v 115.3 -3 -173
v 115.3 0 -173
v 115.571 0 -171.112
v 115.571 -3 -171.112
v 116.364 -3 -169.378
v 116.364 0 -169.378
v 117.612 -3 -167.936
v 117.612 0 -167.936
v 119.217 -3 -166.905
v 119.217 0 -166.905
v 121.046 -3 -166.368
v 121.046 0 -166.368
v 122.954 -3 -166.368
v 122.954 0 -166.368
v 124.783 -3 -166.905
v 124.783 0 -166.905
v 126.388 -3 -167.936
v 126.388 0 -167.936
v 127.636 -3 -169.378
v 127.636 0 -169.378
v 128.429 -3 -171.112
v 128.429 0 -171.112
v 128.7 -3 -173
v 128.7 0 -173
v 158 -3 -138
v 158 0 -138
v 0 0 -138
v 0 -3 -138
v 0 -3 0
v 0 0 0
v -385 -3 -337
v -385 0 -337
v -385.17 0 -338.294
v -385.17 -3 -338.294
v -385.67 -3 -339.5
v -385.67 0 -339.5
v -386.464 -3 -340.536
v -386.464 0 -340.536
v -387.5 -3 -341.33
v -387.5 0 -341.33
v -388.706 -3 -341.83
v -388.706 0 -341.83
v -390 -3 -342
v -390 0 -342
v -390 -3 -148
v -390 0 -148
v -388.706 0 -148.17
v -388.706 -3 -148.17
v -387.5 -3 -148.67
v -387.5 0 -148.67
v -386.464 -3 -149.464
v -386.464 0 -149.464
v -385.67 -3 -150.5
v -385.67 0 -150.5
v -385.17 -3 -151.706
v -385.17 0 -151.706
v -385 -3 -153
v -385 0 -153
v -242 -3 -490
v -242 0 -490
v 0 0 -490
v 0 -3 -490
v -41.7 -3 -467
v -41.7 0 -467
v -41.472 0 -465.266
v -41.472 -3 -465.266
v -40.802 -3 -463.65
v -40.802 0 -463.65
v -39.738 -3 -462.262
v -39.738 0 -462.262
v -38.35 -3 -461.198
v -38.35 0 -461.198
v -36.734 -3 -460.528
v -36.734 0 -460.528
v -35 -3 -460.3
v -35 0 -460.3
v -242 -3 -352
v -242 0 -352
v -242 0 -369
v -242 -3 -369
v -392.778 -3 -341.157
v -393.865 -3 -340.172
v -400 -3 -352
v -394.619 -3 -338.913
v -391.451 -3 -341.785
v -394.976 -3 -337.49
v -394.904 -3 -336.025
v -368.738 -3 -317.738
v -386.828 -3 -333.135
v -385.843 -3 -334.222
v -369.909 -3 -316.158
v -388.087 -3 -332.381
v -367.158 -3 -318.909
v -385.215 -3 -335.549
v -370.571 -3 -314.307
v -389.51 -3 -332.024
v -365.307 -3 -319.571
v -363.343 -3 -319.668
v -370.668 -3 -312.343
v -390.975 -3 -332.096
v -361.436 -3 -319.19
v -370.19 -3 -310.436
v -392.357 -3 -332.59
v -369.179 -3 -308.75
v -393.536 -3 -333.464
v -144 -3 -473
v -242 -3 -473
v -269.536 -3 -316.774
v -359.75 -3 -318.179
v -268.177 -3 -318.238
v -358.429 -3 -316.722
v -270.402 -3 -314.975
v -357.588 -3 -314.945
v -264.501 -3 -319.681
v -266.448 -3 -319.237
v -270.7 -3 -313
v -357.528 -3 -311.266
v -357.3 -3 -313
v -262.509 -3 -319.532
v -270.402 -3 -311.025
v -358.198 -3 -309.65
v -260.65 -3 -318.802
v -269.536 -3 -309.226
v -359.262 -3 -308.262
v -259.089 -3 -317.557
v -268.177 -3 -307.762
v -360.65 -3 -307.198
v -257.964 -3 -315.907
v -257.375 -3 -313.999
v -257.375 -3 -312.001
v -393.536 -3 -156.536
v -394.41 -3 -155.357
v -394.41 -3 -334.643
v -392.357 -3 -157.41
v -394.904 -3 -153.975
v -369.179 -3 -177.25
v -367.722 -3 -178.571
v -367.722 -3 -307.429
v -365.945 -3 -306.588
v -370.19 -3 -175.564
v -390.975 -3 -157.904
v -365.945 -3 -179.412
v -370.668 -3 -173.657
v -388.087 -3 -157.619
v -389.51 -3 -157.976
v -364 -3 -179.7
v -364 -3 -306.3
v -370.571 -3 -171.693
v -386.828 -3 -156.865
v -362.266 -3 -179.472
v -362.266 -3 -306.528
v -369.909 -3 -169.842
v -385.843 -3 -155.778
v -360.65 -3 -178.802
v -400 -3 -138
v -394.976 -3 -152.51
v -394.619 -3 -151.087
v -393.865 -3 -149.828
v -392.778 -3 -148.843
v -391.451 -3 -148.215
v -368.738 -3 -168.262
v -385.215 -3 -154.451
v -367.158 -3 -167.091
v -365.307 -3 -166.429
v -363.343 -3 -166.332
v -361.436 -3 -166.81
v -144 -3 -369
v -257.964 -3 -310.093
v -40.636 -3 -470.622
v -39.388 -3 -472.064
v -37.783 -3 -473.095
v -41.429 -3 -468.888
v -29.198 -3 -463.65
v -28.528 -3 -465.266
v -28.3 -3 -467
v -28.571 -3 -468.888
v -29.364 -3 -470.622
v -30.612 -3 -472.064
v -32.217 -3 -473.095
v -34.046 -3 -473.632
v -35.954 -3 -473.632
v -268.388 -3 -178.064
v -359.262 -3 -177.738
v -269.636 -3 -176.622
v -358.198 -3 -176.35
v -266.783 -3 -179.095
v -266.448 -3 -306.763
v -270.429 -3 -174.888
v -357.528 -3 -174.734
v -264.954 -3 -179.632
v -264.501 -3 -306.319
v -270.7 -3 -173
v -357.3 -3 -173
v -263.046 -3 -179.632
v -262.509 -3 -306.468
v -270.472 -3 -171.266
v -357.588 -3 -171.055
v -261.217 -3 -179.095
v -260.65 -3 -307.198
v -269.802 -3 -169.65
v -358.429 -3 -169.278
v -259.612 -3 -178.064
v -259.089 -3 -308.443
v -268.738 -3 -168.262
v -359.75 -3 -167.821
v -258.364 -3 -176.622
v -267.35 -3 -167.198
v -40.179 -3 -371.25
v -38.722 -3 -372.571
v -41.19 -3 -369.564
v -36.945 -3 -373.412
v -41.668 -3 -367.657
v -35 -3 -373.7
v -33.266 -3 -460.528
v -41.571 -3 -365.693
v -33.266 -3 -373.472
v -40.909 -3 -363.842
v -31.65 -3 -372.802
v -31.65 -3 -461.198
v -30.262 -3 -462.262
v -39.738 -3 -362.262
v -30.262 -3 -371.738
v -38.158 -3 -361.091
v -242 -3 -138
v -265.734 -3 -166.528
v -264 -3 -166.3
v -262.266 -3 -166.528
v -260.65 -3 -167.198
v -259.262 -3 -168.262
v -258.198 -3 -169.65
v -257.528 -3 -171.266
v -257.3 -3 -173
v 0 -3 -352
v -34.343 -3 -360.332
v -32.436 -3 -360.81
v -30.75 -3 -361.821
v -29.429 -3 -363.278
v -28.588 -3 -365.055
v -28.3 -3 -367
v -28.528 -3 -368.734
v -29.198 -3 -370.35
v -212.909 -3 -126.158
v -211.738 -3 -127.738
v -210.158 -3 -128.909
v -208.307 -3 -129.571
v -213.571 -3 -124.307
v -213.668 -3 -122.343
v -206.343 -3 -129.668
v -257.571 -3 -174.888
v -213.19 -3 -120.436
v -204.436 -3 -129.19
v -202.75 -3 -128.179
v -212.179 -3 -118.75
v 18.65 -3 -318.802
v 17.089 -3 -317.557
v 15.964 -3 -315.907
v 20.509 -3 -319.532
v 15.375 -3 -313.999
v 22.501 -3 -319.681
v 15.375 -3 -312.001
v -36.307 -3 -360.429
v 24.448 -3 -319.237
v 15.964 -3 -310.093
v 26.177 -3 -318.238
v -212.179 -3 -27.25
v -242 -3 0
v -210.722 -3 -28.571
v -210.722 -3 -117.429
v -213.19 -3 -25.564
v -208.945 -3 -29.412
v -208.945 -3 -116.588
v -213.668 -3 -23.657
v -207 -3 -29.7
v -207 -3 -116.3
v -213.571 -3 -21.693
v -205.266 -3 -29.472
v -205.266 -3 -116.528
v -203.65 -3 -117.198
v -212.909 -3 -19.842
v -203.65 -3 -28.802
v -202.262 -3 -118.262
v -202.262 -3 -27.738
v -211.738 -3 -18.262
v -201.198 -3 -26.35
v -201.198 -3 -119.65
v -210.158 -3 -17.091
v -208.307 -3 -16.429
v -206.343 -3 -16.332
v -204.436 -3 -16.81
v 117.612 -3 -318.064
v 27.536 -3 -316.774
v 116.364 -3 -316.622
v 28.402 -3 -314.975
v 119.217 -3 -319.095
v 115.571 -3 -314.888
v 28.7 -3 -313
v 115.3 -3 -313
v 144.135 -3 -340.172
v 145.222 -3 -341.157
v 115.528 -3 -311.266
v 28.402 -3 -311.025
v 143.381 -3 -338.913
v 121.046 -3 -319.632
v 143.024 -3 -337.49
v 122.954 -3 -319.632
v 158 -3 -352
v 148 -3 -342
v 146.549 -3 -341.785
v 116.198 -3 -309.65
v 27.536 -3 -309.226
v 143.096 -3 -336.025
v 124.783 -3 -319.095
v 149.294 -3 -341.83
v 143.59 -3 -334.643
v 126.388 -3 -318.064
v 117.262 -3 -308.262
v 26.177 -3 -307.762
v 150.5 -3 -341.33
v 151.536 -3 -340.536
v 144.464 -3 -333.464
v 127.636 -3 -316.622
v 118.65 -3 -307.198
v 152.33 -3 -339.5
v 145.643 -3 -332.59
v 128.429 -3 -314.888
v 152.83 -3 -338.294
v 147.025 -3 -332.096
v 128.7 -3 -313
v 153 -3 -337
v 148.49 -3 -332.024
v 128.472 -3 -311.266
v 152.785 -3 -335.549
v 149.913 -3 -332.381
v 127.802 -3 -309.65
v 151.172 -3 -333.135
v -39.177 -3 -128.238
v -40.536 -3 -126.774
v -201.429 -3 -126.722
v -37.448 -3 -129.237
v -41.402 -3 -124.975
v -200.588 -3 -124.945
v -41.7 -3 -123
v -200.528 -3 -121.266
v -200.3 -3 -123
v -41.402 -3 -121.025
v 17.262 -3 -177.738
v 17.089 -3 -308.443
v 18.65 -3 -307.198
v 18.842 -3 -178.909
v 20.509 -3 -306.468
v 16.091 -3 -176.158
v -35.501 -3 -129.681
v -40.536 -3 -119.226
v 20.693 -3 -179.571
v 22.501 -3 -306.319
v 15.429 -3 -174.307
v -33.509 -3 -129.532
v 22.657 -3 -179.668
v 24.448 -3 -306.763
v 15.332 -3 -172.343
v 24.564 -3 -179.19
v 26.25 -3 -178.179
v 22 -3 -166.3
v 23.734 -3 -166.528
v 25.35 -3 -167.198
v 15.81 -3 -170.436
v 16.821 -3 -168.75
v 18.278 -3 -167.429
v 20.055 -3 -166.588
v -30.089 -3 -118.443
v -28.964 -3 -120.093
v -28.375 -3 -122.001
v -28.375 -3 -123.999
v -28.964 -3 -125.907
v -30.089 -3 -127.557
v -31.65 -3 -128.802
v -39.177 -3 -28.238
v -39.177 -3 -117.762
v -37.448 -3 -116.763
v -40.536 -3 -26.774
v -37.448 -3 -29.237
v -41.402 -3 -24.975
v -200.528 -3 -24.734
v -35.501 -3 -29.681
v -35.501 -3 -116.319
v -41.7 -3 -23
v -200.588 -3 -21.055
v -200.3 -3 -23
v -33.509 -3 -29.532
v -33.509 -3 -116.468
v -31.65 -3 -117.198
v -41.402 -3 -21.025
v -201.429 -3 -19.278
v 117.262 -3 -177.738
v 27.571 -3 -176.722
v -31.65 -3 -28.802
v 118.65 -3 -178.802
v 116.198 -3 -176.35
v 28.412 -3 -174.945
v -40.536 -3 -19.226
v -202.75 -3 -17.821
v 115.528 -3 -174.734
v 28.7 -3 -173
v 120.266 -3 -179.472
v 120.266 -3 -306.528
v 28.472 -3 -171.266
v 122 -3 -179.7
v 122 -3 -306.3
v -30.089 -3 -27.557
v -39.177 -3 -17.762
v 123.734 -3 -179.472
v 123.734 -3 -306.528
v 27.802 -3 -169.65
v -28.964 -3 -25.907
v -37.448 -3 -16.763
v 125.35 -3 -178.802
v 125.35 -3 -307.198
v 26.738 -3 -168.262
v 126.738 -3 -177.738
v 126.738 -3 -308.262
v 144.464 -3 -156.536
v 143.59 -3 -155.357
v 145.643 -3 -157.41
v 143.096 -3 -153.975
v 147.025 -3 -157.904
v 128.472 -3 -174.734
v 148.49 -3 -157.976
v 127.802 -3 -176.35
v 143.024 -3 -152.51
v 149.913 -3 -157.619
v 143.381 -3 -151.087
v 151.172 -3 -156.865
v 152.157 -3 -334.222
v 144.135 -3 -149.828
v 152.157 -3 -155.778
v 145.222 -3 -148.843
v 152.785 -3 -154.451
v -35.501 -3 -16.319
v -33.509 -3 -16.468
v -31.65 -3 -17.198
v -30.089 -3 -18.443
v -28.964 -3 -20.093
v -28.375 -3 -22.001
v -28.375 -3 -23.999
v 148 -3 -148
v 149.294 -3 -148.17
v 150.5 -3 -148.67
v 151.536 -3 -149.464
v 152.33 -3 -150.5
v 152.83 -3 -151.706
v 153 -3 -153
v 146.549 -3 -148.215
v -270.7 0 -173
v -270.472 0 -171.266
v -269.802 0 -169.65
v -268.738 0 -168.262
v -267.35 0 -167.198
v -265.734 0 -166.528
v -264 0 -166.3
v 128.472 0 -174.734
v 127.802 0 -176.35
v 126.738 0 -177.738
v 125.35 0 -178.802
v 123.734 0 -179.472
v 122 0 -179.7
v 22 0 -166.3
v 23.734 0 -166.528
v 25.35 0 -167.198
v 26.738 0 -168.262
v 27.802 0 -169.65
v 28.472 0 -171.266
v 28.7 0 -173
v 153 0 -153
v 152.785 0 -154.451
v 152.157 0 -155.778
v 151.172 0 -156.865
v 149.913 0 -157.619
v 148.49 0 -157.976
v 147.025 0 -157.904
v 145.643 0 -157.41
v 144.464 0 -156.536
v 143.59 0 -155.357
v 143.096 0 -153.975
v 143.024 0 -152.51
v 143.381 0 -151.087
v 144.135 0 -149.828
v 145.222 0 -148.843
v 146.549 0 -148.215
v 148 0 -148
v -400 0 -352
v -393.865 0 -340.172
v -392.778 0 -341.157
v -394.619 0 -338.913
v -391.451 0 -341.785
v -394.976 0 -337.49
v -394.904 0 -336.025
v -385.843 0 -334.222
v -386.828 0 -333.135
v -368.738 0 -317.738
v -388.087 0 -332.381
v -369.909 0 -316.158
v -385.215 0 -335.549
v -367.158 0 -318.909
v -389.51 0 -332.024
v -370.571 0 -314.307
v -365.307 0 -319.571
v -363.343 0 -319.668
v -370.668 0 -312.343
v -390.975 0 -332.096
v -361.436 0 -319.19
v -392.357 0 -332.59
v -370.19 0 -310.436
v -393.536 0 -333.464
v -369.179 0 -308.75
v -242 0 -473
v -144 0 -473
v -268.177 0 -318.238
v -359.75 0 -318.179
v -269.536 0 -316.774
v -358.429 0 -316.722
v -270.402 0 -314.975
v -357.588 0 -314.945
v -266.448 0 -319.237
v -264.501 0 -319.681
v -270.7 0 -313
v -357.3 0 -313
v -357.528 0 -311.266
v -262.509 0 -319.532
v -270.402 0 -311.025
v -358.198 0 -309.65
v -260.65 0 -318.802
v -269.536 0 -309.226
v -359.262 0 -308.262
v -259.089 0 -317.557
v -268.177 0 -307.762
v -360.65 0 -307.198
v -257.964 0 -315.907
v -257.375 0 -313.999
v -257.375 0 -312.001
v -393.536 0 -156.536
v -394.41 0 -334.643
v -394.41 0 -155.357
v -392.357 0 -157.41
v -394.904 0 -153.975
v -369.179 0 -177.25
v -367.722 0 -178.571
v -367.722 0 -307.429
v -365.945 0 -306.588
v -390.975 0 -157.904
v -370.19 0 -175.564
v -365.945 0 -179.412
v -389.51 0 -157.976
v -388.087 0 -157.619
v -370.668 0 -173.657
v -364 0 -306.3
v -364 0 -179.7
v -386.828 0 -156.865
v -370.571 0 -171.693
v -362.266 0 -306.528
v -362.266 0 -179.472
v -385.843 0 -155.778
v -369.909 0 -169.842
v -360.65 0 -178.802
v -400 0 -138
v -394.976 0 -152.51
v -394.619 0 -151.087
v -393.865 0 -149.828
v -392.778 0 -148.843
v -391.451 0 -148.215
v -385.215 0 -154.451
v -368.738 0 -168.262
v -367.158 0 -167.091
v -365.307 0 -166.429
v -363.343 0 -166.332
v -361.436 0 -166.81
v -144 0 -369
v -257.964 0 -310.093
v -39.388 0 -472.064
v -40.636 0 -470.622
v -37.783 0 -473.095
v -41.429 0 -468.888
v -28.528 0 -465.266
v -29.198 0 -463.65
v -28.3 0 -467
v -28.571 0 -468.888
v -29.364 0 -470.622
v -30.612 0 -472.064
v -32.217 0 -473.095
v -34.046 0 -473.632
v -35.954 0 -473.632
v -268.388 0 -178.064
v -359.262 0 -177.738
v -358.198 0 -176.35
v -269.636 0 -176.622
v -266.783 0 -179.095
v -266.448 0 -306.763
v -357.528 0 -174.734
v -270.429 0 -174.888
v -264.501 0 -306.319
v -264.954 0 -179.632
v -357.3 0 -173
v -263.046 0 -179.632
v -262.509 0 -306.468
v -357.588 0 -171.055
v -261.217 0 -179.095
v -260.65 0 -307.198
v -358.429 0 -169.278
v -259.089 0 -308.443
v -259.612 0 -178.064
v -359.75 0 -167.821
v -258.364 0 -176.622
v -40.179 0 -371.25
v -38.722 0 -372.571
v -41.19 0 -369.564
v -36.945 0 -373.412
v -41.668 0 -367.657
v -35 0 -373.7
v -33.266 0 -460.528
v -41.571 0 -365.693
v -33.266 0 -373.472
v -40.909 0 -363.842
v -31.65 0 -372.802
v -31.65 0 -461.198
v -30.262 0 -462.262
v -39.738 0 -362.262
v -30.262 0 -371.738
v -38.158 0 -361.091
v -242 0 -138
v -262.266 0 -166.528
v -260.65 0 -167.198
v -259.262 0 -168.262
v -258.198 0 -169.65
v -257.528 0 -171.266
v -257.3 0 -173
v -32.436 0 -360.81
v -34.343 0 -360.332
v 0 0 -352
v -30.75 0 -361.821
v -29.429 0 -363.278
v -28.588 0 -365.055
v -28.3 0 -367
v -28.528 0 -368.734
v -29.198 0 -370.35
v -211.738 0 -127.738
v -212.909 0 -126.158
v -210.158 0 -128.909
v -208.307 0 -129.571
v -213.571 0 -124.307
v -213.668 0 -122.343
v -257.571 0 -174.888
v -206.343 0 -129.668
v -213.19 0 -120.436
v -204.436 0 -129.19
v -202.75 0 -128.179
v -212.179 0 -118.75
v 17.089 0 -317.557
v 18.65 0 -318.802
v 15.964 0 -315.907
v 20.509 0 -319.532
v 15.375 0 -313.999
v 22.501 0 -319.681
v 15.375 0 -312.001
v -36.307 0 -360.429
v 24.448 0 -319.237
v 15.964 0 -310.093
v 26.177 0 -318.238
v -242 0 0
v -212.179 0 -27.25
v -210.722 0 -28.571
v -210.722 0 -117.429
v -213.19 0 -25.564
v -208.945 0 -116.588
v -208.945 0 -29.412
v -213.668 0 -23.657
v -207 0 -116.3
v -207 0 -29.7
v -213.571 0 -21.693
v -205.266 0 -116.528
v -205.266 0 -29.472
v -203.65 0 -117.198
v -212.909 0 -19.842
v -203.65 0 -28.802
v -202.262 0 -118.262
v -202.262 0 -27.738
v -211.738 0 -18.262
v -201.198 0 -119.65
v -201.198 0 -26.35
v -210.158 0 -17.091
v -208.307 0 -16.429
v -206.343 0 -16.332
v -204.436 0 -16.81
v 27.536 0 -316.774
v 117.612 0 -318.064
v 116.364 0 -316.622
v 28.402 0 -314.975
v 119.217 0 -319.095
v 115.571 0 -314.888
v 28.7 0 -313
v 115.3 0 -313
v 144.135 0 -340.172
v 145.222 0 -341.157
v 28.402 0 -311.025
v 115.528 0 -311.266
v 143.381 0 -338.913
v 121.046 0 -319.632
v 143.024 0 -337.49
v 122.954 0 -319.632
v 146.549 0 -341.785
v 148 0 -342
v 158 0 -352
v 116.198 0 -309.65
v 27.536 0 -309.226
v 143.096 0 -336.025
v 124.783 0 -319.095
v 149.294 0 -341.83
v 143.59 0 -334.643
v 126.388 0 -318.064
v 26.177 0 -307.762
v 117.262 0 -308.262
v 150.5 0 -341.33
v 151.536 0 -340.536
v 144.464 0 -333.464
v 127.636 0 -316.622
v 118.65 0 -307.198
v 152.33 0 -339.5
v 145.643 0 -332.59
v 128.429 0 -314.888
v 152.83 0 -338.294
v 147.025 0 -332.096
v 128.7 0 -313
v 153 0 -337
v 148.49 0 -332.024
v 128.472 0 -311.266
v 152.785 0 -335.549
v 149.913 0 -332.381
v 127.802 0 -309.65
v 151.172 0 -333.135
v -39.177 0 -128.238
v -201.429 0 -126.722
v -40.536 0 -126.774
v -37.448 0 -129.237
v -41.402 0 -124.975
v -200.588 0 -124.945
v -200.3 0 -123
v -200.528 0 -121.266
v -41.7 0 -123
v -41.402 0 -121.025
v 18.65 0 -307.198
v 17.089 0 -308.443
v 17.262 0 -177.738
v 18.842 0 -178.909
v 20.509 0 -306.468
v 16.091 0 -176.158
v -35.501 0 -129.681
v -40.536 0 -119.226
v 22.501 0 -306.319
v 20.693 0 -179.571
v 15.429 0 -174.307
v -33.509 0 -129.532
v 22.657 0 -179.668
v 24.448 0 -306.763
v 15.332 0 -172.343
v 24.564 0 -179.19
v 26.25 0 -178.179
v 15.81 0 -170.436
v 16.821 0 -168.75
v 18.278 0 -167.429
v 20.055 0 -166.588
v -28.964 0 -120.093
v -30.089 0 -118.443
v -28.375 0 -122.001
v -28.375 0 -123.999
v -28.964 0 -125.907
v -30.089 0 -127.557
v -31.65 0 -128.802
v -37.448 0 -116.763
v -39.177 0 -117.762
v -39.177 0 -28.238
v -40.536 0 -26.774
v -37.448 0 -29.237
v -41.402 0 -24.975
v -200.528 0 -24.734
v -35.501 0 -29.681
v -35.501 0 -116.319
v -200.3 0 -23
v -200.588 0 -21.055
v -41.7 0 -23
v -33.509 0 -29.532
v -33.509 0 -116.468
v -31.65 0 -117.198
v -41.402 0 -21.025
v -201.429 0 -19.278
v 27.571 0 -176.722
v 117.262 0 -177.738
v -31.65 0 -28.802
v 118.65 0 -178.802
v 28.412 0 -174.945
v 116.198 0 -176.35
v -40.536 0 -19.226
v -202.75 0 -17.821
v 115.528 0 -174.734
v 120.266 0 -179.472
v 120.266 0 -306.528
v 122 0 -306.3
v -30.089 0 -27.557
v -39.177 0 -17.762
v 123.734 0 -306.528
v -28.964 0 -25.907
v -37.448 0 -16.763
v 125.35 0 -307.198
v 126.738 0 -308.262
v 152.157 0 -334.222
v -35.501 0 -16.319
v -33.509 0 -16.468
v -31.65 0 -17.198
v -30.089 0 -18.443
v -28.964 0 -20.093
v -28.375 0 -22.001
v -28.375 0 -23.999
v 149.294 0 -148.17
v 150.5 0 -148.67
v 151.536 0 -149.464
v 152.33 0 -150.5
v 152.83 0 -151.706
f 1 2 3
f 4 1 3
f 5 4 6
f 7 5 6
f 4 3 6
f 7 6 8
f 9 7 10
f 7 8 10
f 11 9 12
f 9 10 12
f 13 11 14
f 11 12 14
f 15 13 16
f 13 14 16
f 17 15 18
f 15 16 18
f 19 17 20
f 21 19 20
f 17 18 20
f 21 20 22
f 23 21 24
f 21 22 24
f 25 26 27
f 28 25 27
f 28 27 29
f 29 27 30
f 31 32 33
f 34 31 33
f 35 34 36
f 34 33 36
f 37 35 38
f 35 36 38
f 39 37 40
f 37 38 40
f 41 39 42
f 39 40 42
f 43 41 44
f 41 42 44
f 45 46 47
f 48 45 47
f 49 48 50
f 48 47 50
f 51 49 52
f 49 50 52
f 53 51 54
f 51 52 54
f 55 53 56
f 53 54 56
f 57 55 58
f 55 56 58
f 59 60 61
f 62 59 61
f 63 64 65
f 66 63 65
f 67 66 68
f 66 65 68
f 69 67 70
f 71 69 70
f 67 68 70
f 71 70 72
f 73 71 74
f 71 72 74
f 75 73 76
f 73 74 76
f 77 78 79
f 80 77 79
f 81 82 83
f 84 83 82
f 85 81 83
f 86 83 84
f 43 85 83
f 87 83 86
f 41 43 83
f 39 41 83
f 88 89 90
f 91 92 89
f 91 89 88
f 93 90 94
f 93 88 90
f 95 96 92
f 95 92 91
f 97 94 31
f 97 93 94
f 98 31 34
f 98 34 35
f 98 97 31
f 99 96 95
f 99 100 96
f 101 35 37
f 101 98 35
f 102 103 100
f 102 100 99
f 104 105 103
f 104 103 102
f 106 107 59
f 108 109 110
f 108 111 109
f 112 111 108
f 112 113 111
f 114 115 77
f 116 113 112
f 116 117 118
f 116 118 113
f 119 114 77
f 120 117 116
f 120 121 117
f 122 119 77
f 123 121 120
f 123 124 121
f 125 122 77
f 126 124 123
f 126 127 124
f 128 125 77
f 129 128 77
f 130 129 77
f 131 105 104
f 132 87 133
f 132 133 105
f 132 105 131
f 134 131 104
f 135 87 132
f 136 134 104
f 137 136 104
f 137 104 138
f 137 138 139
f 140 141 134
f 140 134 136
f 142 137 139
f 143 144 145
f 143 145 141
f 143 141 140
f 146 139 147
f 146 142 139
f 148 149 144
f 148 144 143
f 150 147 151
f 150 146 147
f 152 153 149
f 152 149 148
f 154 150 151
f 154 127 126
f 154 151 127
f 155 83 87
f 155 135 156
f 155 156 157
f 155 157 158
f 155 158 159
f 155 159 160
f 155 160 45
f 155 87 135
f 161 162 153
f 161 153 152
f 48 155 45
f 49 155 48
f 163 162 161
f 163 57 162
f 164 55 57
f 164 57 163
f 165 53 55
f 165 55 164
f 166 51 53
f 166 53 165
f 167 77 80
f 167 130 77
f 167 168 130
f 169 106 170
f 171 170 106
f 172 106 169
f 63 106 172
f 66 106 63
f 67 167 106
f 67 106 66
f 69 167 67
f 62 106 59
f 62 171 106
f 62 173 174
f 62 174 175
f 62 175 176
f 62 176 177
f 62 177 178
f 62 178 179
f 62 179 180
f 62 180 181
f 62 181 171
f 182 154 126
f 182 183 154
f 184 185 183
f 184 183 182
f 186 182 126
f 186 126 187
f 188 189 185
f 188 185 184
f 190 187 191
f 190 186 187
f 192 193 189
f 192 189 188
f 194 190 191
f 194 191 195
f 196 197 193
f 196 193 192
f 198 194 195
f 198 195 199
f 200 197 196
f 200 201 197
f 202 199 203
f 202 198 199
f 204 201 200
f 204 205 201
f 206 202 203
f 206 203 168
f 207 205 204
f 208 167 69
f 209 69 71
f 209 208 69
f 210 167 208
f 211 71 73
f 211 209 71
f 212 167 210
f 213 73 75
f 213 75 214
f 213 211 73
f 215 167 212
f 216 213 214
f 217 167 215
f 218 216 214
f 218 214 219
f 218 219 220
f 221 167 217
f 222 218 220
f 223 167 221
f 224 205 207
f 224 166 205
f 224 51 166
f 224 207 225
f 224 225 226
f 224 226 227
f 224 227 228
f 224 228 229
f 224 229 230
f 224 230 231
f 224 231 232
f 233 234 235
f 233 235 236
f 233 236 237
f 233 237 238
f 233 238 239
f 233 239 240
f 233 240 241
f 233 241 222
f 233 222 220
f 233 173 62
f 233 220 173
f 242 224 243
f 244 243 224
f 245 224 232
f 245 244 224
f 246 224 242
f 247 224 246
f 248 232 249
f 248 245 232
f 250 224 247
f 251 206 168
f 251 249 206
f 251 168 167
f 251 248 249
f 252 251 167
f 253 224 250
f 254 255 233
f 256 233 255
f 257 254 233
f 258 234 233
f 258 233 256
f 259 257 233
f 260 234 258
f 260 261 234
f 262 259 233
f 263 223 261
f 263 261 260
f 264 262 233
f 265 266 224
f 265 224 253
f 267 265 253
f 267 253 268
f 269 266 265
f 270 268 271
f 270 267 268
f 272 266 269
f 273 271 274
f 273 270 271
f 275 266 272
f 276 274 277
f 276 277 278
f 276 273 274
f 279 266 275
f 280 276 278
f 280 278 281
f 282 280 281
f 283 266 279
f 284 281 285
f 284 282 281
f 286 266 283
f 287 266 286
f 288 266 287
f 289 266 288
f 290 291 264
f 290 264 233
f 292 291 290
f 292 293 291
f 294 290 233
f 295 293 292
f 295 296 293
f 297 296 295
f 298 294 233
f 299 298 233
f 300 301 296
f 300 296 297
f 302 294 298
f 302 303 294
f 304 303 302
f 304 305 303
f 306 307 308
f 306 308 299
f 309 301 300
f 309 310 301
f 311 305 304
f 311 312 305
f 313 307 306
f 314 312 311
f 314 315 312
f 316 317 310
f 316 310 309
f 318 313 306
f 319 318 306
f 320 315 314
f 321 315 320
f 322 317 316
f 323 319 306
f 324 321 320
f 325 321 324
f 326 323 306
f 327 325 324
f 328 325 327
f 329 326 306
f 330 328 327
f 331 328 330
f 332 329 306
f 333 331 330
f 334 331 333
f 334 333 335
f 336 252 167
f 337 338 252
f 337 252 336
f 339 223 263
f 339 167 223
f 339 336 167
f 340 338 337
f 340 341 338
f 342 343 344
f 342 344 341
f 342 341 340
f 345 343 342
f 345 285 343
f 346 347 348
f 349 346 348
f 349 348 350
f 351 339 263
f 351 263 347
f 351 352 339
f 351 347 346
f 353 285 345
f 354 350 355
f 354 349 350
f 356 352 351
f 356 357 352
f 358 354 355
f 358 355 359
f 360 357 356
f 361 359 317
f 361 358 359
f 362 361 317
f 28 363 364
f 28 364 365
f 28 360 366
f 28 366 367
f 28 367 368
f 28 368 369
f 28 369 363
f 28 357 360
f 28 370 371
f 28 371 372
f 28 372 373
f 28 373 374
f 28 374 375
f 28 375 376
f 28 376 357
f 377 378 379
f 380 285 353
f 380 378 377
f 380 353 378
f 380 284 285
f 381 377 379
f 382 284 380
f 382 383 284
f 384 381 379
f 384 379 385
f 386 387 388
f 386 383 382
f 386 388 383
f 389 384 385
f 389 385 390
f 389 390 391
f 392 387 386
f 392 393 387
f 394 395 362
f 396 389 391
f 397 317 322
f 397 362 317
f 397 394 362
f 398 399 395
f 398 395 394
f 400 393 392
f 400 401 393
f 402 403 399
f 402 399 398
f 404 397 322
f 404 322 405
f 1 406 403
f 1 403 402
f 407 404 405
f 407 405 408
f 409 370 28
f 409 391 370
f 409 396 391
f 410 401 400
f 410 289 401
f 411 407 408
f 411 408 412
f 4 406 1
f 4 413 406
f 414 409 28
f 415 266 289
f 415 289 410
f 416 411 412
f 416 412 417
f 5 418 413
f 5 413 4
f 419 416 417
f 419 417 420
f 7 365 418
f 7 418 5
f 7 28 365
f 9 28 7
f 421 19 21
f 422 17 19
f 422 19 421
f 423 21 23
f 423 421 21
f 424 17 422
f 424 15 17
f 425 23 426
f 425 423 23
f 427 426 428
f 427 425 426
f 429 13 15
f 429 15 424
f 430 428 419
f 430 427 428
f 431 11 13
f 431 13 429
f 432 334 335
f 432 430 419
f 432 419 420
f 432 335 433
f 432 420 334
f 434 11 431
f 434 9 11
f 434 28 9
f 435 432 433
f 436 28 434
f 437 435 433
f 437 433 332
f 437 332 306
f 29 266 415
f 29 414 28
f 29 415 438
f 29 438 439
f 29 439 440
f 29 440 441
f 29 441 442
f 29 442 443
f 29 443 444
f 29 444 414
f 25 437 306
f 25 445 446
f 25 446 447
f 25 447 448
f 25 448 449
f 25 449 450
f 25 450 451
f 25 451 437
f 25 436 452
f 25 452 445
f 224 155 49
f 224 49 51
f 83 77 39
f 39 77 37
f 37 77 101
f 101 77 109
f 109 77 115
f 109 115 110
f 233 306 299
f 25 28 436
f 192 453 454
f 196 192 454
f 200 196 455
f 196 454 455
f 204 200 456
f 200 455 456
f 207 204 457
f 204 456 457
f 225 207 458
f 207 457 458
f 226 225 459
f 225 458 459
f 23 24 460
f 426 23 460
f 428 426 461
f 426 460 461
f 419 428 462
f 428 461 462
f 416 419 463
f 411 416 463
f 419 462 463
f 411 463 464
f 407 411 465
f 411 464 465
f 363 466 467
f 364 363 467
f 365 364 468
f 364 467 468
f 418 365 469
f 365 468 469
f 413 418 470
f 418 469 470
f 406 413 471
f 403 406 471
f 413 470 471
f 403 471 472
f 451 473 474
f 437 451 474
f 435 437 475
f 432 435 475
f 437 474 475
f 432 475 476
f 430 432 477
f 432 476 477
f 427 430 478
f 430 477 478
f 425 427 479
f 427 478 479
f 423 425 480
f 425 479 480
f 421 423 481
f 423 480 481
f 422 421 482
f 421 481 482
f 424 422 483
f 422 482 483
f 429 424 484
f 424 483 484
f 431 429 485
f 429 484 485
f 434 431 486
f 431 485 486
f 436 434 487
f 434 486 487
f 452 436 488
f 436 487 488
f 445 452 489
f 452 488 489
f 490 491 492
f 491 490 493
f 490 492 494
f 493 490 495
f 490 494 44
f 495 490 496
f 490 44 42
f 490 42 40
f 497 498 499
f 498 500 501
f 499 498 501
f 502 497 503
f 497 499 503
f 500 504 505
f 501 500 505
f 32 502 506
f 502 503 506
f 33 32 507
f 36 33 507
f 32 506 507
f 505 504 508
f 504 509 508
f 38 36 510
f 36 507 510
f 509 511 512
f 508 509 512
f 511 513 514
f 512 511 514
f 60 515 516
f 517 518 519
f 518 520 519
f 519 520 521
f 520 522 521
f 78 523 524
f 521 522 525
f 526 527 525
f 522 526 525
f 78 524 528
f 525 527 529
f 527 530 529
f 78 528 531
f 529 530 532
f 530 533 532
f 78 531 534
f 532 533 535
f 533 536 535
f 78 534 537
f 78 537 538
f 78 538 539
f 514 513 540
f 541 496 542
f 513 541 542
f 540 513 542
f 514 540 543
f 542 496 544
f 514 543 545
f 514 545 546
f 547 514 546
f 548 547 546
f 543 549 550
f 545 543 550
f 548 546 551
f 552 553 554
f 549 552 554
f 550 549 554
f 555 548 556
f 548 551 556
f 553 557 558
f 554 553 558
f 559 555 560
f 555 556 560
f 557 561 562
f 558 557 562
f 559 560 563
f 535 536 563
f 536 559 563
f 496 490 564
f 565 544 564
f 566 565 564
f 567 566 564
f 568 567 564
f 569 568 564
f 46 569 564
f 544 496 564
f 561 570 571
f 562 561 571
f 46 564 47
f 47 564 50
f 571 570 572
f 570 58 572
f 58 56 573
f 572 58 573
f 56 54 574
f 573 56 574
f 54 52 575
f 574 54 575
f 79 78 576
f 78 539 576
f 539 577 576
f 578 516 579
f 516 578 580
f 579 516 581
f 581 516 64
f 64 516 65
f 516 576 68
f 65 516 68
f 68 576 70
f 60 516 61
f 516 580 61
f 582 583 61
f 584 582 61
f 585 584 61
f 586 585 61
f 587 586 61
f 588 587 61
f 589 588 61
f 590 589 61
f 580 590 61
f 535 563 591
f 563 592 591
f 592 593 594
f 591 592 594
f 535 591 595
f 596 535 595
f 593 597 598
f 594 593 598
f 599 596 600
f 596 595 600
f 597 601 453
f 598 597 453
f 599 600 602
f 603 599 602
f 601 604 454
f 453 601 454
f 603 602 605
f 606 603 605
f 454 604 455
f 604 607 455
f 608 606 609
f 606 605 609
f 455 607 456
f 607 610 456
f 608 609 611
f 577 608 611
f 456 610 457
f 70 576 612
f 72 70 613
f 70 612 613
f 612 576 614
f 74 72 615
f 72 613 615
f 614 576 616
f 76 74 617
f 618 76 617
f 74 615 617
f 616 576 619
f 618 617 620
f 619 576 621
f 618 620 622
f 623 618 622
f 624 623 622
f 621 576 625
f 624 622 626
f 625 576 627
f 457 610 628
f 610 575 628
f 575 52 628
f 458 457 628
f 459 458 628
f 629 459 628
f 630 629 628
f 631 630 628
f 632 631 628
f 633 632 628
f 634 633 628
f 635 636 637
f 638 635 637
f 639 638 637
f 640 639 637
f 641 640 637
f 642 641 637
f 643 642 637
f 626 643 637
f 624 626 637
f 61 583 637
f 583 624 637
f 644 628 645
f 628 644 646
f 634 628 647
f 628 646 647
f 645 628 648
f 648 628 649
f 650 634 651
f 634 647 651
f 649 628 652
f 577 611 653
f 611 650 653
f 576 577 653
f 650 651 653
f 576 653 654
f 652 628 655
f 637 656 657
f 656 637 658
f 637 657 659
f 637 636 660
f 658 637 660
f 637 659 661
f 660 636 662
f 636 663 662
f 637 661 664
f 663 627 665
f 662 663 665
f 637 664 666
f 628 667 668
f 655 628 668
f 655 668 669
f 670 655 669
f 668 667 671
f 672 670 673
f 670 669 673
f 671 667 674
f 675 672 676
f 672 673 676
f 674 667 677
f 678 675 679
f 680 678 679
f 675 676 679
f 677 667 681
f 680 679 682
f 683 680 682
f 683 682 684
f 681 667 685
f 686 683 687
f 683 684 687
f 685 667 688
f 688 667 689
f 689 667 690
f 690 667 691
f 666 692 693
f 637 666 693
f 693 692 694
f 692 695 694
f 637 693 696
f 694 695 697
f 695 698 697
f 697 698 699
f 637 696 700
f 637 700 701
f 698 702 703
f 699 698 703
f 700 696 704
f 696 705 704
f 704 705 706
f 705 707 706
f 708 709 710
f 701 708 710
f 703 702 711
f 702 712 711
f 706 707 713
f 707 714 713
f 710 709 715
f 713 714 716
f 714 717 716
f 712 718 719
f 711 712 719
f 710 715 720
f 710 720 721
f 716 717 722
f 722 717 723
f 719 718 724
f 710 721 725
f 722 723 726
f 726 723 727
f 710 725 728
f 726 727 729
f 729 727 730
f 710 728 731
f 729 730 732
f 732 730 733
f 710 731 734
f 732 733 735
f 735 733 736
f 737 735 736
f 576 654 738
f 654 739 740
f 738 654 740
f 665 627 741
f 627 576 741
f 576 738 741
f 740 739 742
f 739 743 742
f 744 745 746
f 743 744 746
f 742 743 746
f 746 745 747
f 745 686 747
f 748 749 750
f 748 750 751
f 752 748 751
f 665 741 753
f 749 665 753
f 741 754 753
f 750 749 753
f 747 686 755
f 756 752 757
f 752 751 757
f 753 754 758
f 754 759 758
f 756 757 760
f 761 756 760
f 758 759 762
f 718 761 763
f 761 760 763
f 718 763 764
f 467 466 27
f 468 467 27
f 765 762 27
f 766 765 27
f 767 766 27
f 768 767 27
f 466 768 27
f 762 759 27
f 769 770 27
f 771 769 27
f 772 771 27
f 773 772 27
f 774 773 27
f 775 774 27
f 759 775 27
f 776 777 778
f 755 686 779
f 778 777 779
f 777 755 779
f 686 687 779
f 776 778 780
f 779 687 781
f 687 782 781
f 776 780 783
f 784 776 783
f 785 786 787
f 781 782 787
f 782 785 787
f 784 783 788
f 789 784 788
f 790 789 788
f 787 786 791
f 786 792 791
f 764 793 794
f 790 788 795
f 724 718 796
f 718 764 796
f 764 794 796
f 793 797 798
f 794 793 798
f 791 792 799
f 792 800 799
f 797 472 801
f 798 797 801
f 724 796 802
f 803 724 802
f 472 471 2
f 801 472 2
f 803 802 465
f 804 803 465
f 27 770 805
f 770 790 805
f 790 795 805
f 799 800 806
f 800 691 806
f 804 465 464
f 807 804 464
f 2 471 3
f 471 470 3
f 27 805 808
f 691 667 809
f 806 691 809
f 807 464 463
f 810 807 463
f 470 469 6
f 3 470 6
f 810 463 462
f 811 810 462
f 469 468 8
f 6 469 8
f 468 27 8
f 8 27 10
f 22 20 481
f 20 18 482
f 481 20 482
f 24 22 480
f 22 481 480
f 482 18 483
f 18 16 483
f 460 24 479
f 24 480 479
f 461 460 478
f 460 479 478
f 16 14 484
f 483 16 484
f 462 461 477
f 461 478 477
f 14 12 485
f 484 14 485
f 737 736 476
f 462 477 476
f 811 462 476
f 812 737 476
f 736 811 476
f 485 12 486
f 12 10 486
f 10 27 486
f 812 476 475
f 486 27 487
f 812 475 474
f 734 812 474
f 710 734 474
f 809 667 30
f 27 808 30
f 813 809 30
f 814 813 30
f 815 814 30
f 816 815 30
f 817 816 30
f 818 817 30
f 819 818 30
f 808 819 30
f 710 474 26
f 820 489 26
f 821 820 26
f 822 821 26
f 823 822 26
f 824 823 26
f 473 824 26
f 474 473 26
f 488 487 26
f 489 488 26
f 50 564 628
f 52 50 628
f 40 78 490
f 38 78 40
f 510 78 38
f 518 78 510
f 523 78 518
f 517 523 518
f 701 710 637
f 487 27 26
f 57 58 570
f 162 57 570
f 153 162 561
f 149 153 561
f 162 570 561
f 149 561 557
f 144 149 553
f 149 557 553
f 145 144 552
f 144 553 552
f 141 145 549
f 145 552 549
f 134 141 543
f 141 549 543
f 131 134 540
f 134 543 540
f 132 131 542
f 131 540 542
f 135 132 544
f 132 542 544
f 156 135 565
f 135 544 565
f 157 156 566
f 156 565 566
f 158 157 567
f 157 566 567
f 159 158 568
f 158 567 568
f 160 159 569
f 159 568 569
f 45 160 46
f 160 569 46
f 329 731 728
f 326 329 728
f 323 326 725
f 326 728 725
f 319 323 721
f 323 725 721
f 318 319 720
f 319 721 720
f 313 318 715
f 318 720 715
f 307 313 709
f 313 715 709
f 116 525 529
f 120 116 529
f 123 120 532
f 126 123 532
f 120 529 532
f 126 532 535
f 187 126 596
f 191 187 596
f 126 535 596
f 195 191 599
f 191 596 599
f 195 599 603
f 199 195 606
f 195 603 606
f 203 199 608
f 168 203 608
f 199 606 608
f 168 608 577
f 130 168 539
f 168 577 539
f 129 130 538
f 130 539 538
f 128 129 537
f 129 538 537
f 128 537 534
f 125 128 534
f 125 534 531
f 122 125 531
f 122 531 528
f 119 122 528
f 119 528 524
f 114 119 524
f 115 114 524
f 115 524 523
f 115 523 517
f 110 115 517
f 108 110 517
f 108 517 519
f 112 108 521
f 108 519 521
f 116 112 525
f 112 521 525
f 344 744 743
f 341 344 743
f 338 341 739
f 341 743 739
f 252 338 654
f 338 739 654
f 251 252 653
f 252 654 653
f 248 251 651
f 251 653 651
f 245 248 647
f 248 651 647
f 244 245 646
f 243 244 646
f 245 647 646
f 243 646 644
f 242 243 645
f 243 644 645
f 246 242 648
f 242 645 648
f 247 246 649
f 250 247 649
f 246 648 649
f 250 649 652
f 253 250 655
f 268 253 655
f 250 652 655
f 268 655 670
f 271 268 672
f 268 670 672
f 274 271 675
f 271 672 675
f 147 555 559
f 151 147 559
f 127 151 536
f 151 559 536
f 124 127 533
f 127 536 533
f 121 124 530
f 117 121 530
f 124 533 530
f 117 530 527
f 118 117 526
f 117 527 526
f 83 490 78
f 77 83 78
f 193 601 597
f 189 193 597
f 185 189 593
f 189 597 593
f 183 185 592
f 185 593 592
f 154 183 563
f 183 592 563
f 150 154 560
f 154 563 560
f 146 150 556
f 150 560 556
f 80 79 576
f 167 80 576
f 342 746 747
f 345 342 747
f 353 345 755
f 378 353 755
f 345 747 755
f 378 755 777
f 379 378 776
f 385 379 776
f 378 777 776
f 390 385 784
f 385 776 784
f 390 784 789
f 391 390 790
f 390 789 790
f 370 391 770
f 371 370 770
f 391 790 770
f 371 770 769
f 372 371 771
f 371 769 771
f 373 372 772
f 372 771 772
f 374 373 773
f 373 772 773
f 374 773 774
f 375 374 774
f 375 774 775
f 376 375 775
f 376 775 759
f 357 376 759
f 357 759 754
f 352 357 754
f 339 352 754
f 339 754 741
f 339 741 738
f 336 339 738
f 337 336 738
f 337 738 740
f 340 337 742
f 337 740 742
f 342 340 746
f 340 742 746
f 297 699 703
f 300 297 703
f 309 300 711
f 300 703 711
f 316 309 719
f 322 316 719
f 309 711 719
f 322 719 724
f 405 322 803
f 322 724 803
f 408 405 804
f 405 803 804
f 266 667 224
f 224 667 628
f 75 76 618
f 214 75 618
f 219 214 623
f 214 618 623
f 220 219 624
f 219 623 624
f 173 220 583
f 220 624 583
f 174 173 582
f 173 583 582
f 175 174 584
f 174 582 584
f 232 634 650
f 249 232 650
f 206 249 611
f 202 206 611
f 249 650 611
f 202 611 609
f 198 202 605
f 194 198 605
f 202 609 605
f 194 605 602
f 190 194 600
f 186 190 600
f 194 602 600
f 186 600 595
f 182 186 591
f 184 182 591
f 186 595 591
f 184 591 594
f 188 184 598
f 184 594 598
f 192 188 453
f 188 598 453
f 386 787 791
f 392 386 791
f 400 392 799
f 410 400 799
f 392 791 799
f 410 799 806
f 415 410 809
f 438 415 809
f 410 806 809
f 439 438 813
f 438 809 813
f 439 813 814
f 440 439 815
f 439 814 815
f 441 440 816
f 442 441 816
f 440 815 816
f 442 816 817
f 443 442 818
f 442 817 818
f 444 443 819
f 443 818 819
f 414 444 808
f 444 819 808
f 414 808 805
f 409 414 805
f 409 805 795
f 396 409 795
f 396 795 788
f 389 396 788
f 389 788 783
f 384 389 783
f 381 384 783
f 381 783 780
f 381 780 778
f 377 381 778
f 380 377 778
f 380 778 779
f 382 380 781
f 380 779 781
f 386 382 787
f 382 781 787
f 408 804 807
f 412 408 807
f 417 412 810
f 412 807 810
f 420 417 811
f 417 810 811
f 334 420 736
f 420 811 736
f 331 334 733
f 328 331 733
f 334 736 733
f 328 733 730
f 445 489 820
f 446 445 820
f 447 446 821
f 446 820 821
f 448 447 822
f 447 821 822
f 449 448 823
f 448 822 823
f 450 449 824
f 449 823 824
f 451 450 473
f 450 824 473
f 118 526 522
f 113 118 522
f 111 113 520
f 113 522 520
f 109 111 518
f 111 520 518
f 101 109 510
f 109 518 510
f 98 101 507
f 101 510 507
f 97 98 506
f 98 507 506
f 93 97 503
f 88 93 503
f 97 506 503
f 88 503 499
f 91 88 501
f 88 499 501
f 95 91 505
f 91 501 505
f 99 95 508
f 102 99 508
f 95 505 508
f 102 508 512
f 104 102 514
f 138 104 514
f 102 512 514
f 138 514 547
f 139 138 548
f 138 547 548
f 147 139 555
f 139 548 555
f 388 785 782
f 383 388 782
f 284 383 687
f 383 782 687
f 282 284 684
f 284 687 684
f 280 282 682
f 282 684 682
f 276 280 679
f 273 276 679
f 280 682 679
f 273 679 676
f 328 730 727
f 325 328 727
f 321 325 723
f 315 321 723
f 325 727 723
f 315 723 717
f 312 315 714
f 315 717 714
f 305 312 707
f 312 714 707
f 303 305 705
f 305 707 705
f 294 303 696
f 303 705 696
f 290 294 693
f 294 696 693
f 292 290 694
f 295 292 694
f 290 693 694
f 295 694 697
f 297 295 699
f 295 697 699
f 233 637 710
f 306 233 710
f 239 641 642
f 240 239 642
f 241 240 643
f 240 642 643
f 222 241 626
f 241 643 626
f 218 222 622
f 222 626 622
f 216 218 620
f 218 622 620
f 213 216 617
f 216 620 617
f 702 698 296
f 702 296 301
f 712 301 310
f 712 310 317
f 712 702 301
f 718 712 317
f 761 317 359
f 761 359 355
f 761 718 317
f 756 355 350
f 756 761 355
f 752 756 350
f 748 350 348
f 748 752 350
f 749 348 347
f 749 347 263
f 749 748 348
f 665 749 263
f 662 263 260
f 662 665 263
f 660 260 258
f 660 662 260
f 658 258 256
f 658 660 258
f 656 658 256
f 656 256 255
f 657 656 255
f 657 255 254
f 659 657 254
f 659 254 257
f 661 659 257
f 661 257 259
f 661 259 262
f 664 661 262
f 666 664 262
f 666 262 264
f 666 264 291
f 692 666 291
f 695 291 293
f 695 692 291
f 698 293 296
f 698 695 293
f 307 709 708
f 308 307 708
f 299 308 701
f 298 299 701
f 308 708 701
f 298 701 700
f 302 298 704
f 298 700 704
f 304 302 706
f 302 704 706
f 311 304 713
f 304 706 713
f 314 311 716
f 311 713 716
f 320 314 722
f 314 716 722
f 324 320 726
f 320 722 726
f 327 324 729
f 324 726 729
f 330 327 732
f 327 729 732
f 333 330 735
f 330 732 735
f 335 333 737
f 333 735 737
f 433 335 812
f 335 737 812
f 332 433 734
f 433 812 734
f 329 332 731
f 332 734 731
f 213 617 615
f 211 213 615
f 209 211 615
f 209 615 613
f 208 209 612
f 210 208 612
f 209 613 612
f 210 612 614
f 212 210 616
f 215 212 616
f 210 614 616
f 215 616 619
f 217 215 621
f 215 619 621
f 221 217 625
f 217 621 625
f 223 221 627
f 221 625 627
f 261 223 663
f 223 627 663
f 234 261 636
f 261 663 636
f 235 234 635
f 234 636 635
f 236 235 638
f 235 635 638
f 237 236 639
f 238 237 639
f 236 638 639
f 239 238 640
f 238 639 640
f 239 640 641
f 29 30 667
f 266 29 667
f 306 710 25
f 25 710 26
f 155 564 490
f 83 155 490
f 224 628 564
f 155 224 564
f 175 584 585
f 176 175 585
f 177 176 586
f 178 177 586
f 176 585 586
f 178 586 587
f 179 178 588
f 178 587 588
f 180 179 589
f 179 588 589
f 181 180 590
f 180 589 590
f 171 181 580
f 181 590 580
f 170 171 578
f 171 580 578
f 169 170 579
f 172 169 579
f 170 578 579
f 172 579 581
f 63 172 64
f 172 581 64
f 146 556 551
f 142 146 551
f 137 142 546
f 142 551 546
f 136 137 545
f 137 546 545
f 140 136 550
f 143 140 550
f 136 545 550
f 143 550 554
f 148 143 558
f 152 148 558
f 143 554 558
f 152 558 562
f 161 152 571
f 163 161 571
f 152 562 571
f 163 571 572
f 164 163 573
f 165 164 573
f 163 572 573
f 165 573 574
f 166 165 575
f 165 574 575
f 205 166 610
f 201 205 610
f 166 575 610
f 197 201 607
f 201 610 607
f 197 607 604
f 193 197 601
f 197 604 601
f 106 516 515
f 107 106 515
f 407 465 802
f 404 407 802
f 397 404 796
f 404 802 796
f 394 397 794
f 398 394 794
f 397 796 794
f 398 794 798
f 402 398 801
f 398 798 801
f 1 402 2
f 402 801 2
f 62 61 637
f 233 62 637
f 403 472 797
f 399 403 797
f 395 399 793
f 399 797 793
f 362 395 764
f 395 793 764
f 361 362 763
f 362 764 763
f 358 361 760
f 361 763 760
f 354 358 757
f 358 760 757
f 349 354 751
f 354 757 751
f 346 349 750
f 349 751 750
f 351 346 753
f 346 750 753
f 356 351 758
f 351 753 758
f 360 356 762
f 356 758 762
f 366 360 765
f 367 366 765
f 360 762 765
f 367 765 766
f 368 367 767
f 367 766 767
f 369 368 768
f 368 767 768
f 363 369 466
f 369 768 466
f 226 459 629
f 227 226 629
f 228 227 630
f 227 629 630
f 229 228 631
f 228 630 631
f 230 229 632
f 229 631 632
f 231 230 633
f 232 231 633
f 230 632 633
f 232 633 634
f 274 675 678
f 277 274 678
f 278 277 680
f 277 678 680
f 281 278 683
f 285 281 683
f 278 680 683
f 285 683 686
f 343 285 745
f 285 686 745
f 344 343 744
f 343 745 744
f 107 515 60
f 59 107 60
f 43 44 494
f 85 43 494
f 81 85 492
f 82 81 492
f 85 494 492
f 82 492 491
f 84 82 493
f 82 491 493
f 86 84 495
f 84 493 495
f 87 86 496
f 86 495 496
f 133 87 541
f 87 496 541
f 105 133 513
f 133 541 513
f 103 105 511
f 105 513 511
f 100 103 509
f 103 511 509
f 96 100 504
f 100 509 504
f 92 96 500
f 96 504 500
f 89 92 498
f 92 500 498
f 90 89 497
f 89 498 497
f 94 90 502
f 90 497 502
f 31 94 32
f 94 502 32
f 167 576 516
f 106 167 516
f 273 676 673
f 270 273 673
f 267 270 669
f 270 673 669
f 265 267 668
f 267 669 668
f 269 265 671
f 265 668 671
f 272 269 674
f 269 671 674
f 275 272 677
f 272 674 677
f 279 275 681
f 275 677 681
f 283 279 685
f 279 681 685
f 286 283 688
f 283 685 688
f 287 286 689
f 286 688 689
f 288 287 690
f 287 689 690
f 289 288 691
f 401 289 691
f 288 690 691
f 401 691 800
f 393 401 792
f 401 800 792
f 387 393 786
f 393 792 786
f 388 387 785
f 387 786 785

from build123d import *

# Parameters (mm, degrees)
F0_W     = 242
F0_H     = 214
F0_R     = 6.7
F1_DEPTH = 3


with BuildPart() as f1:
    # F0 (on Front) → F1 (new body)
    with BuildSketch(Plane.XZ):
        Polygon((0, -138), (0, 0), (-121, 0), (-242, 0), (-242, -138), align=None)
        with BuildLine():
            ThreePointArc((-200.3, -123), (-211.7376154339, -127.7376154339), (-207, -116.3))
            ThreePointArc((-207, -116.3), (-202.2623845661, -118.2623845661), (-200.3, -123))
        make_face(mode=Mode.SUBTRACT)
        with BuildLine():
            ThreePointArc((-207, -29.7), (-211.7376154339, -18.2623845661), (-200.3, -23))
            ThreePointArc((-200.3, -23), (-202.2623845661, -27.7376154339), (-207, -29.7))
        make_face(mode=Mode.SUBTRACT)
        with BuildLine():
            ThreePointArc((-28.3, -123), (-35, -129.7), (-41.7, -123))
            ThreePointArc((-41.7, -123), (-35, -116.3), (-28.3, -123))
        make_face(mode=Mode.SUBTRACT)
        with BuildLine():
            ThreePointArc((-28.3, -23), (-35, -29.7), (-41.7, -23))
            ThreePointArc((-41.7, -23), (-35, -16.3), (-28.3, -23))
        make_face(mode=Mode.SUBTRACT)
        with Locations((-121, -245)):
            Rectangle(F0_W, F0_H)
        Polygon((22, -138), (0, -138), (0, -352), (138, -352), (138, -138), align=None)
        with Locations((22, -313)):
            Circle(F0_R, mode=Mode.SUBTRACT)
        with BuildLine():
            ThreePointArc((115.3, -313), (117.2623845661, -308.2623845661), (122, -306.3))
            ThreePointArc((122, -306.3), (126.7376154339, -308.2623845661), (128.7, -313))
            ThreePointArc((128.7, -313), (122, -319.7), (115.3, -313))
        make_face(mode=Mode.SUBTRACT)
        with BuildLine():
            ThreePointArc((28.7, -173), (17.2623845661, -177.7376154339), (22, -166.3))
            ThreePointArc((22, -166.3), (26.7376154339, -168.2623845661), (28.7, -173))
        make_face(mode=Mode.SUBTRACT)
        with BuildLine():
            ThreePointArc((122, -179.7), (117.2623845661, -177.7376154339), (115.3, -173))
            ThreePointArc((115.3, -173), (122, -166.3), (128.7, -173))
            ThreePointArc((128.7, -173), (126.7376154339, -177.7376154339), (122, -179.7))
        make_face(mode=Mode.SUBTRACT)
        Polygon((-242, -352), (-242, -138), (-264, -138), (-380, -138), (-380, -352), align=None)
        with BuildLine():
            ThreePointArc((-357.3, -313), (-368.7376154339, -317.7376154339), (-364, -306.3))
            ThreePointArc((-364, -306.3), (-359.2623845661, -308.2623845661), (-357.3, -313))
        make_face(mode=Mode.SUBTRACT)
        with BuildLine():
            ThreePointArc((-257.3, -313), (-264, -319.7), (-270.7, -313))
            ThreePointArc((-270.7, -313), (-264, -306.3), (-257.3, -313))
        make_face(mode=Mode.SUBTRACT)
        with BuildLine():
            ThreePointArc((-364, -179.7), (-368.7376154339, -168.2623845661), (-357.3, -173))
            ThreePointArc((-357.3, -173), (-359.2623845661, -177.7376154339), (-364, -179.7))
        make_face(mode=Mode.SUBTRACT)
        with BuildLine():
            ThreePointArc((-270.7, -173), (-268.7376154339, -168.2623845661), (-264, -166.3))
            ThreePointArc((-264, -166.3), (-259.2623845661, -168.2623845661), (-257.3, -173))
            ThreePointArc((-257.3, -173), (-264, -179.7), (-270.7, -173))
        make_face(mode=Mode.SUBTRACT)
        Polygon((0, -490), (0, -352), (-242, -352), (-242, -369), (-144, -369), (-144, -473), (-242, -473), (-242, -490), (-144, -490), (-121, -490), align=None)
        with BuildLine():
            ThreePointArc((-28.3, -467), (-35, -473.7), (-41.7, -467))
            ThreePointArc((-41.7, -467), (-39.7376154339, -462.2623845661), (-35, -460.3))
            ThreePointArc((-35, -460.3), (-30.2623845661, -462.2623845661), (-28.3, -467))
        make_face(mode=Mode.SUBTRACT)
        with BuildLine():
            ThreePointArc((-28.3, -367), (-30.2623845661, -371.7376154339), (-35, -373.7))
            ThreePointArc((-35, -373.7), (-39.7376154339, -362.2623845661), (-28.3, -367))
        make_face(mode=Mode.SUBTRACT)
        Polygon((138, -138), (138, -352), (148, -352), (158, -352), (158, -138), (148, -138), align=None)
        with BuildLine():
            ThreePointArc((153, -337), (151.5355339059, -340.5355339059), (148, -342))
            ThreePointArc((148, -342), (144.4644660941, -333.4644660941), (153, -337))
        make_face(mode=Mode.SUBTRACT)
        with BuildLine():
            ThreePointArc((153, -153), (144.4644660941, -156.5355339059), (148, -148))
            ThreePointArc((148, -148), (151.5355339059, -149.4644660941), (153, -153))
        make_face(mode=Mode.SUBTRACT)
        Polygon((-390, -352), (-380, -352), (-380, -138), (-390, -138), (-400, -138), (-400, -352), align=None)
        with BuildLine():
            ThreePointArc((-385, -337), (-386.4644660941, -340.5355339059), (-390, -342))
            ThreePointArc((-390, -342), (-393.5355339059, -333.4644660941), (-385, -337))
        make_face(mode=Mode.SUBTRACT)
        with BuildLine():
            ThreePointArc((-385, -153), (-393.5355339059, -156.5355339059), (-390, -148))
            ThreePointArc((-390, -148), (-386.4644660941, -149.4644660941), (-385, -153))
        make_face(mode=Mode.SUBTRACT)
    extrude(amount=F1_DEPTH)


solid = f1.part
